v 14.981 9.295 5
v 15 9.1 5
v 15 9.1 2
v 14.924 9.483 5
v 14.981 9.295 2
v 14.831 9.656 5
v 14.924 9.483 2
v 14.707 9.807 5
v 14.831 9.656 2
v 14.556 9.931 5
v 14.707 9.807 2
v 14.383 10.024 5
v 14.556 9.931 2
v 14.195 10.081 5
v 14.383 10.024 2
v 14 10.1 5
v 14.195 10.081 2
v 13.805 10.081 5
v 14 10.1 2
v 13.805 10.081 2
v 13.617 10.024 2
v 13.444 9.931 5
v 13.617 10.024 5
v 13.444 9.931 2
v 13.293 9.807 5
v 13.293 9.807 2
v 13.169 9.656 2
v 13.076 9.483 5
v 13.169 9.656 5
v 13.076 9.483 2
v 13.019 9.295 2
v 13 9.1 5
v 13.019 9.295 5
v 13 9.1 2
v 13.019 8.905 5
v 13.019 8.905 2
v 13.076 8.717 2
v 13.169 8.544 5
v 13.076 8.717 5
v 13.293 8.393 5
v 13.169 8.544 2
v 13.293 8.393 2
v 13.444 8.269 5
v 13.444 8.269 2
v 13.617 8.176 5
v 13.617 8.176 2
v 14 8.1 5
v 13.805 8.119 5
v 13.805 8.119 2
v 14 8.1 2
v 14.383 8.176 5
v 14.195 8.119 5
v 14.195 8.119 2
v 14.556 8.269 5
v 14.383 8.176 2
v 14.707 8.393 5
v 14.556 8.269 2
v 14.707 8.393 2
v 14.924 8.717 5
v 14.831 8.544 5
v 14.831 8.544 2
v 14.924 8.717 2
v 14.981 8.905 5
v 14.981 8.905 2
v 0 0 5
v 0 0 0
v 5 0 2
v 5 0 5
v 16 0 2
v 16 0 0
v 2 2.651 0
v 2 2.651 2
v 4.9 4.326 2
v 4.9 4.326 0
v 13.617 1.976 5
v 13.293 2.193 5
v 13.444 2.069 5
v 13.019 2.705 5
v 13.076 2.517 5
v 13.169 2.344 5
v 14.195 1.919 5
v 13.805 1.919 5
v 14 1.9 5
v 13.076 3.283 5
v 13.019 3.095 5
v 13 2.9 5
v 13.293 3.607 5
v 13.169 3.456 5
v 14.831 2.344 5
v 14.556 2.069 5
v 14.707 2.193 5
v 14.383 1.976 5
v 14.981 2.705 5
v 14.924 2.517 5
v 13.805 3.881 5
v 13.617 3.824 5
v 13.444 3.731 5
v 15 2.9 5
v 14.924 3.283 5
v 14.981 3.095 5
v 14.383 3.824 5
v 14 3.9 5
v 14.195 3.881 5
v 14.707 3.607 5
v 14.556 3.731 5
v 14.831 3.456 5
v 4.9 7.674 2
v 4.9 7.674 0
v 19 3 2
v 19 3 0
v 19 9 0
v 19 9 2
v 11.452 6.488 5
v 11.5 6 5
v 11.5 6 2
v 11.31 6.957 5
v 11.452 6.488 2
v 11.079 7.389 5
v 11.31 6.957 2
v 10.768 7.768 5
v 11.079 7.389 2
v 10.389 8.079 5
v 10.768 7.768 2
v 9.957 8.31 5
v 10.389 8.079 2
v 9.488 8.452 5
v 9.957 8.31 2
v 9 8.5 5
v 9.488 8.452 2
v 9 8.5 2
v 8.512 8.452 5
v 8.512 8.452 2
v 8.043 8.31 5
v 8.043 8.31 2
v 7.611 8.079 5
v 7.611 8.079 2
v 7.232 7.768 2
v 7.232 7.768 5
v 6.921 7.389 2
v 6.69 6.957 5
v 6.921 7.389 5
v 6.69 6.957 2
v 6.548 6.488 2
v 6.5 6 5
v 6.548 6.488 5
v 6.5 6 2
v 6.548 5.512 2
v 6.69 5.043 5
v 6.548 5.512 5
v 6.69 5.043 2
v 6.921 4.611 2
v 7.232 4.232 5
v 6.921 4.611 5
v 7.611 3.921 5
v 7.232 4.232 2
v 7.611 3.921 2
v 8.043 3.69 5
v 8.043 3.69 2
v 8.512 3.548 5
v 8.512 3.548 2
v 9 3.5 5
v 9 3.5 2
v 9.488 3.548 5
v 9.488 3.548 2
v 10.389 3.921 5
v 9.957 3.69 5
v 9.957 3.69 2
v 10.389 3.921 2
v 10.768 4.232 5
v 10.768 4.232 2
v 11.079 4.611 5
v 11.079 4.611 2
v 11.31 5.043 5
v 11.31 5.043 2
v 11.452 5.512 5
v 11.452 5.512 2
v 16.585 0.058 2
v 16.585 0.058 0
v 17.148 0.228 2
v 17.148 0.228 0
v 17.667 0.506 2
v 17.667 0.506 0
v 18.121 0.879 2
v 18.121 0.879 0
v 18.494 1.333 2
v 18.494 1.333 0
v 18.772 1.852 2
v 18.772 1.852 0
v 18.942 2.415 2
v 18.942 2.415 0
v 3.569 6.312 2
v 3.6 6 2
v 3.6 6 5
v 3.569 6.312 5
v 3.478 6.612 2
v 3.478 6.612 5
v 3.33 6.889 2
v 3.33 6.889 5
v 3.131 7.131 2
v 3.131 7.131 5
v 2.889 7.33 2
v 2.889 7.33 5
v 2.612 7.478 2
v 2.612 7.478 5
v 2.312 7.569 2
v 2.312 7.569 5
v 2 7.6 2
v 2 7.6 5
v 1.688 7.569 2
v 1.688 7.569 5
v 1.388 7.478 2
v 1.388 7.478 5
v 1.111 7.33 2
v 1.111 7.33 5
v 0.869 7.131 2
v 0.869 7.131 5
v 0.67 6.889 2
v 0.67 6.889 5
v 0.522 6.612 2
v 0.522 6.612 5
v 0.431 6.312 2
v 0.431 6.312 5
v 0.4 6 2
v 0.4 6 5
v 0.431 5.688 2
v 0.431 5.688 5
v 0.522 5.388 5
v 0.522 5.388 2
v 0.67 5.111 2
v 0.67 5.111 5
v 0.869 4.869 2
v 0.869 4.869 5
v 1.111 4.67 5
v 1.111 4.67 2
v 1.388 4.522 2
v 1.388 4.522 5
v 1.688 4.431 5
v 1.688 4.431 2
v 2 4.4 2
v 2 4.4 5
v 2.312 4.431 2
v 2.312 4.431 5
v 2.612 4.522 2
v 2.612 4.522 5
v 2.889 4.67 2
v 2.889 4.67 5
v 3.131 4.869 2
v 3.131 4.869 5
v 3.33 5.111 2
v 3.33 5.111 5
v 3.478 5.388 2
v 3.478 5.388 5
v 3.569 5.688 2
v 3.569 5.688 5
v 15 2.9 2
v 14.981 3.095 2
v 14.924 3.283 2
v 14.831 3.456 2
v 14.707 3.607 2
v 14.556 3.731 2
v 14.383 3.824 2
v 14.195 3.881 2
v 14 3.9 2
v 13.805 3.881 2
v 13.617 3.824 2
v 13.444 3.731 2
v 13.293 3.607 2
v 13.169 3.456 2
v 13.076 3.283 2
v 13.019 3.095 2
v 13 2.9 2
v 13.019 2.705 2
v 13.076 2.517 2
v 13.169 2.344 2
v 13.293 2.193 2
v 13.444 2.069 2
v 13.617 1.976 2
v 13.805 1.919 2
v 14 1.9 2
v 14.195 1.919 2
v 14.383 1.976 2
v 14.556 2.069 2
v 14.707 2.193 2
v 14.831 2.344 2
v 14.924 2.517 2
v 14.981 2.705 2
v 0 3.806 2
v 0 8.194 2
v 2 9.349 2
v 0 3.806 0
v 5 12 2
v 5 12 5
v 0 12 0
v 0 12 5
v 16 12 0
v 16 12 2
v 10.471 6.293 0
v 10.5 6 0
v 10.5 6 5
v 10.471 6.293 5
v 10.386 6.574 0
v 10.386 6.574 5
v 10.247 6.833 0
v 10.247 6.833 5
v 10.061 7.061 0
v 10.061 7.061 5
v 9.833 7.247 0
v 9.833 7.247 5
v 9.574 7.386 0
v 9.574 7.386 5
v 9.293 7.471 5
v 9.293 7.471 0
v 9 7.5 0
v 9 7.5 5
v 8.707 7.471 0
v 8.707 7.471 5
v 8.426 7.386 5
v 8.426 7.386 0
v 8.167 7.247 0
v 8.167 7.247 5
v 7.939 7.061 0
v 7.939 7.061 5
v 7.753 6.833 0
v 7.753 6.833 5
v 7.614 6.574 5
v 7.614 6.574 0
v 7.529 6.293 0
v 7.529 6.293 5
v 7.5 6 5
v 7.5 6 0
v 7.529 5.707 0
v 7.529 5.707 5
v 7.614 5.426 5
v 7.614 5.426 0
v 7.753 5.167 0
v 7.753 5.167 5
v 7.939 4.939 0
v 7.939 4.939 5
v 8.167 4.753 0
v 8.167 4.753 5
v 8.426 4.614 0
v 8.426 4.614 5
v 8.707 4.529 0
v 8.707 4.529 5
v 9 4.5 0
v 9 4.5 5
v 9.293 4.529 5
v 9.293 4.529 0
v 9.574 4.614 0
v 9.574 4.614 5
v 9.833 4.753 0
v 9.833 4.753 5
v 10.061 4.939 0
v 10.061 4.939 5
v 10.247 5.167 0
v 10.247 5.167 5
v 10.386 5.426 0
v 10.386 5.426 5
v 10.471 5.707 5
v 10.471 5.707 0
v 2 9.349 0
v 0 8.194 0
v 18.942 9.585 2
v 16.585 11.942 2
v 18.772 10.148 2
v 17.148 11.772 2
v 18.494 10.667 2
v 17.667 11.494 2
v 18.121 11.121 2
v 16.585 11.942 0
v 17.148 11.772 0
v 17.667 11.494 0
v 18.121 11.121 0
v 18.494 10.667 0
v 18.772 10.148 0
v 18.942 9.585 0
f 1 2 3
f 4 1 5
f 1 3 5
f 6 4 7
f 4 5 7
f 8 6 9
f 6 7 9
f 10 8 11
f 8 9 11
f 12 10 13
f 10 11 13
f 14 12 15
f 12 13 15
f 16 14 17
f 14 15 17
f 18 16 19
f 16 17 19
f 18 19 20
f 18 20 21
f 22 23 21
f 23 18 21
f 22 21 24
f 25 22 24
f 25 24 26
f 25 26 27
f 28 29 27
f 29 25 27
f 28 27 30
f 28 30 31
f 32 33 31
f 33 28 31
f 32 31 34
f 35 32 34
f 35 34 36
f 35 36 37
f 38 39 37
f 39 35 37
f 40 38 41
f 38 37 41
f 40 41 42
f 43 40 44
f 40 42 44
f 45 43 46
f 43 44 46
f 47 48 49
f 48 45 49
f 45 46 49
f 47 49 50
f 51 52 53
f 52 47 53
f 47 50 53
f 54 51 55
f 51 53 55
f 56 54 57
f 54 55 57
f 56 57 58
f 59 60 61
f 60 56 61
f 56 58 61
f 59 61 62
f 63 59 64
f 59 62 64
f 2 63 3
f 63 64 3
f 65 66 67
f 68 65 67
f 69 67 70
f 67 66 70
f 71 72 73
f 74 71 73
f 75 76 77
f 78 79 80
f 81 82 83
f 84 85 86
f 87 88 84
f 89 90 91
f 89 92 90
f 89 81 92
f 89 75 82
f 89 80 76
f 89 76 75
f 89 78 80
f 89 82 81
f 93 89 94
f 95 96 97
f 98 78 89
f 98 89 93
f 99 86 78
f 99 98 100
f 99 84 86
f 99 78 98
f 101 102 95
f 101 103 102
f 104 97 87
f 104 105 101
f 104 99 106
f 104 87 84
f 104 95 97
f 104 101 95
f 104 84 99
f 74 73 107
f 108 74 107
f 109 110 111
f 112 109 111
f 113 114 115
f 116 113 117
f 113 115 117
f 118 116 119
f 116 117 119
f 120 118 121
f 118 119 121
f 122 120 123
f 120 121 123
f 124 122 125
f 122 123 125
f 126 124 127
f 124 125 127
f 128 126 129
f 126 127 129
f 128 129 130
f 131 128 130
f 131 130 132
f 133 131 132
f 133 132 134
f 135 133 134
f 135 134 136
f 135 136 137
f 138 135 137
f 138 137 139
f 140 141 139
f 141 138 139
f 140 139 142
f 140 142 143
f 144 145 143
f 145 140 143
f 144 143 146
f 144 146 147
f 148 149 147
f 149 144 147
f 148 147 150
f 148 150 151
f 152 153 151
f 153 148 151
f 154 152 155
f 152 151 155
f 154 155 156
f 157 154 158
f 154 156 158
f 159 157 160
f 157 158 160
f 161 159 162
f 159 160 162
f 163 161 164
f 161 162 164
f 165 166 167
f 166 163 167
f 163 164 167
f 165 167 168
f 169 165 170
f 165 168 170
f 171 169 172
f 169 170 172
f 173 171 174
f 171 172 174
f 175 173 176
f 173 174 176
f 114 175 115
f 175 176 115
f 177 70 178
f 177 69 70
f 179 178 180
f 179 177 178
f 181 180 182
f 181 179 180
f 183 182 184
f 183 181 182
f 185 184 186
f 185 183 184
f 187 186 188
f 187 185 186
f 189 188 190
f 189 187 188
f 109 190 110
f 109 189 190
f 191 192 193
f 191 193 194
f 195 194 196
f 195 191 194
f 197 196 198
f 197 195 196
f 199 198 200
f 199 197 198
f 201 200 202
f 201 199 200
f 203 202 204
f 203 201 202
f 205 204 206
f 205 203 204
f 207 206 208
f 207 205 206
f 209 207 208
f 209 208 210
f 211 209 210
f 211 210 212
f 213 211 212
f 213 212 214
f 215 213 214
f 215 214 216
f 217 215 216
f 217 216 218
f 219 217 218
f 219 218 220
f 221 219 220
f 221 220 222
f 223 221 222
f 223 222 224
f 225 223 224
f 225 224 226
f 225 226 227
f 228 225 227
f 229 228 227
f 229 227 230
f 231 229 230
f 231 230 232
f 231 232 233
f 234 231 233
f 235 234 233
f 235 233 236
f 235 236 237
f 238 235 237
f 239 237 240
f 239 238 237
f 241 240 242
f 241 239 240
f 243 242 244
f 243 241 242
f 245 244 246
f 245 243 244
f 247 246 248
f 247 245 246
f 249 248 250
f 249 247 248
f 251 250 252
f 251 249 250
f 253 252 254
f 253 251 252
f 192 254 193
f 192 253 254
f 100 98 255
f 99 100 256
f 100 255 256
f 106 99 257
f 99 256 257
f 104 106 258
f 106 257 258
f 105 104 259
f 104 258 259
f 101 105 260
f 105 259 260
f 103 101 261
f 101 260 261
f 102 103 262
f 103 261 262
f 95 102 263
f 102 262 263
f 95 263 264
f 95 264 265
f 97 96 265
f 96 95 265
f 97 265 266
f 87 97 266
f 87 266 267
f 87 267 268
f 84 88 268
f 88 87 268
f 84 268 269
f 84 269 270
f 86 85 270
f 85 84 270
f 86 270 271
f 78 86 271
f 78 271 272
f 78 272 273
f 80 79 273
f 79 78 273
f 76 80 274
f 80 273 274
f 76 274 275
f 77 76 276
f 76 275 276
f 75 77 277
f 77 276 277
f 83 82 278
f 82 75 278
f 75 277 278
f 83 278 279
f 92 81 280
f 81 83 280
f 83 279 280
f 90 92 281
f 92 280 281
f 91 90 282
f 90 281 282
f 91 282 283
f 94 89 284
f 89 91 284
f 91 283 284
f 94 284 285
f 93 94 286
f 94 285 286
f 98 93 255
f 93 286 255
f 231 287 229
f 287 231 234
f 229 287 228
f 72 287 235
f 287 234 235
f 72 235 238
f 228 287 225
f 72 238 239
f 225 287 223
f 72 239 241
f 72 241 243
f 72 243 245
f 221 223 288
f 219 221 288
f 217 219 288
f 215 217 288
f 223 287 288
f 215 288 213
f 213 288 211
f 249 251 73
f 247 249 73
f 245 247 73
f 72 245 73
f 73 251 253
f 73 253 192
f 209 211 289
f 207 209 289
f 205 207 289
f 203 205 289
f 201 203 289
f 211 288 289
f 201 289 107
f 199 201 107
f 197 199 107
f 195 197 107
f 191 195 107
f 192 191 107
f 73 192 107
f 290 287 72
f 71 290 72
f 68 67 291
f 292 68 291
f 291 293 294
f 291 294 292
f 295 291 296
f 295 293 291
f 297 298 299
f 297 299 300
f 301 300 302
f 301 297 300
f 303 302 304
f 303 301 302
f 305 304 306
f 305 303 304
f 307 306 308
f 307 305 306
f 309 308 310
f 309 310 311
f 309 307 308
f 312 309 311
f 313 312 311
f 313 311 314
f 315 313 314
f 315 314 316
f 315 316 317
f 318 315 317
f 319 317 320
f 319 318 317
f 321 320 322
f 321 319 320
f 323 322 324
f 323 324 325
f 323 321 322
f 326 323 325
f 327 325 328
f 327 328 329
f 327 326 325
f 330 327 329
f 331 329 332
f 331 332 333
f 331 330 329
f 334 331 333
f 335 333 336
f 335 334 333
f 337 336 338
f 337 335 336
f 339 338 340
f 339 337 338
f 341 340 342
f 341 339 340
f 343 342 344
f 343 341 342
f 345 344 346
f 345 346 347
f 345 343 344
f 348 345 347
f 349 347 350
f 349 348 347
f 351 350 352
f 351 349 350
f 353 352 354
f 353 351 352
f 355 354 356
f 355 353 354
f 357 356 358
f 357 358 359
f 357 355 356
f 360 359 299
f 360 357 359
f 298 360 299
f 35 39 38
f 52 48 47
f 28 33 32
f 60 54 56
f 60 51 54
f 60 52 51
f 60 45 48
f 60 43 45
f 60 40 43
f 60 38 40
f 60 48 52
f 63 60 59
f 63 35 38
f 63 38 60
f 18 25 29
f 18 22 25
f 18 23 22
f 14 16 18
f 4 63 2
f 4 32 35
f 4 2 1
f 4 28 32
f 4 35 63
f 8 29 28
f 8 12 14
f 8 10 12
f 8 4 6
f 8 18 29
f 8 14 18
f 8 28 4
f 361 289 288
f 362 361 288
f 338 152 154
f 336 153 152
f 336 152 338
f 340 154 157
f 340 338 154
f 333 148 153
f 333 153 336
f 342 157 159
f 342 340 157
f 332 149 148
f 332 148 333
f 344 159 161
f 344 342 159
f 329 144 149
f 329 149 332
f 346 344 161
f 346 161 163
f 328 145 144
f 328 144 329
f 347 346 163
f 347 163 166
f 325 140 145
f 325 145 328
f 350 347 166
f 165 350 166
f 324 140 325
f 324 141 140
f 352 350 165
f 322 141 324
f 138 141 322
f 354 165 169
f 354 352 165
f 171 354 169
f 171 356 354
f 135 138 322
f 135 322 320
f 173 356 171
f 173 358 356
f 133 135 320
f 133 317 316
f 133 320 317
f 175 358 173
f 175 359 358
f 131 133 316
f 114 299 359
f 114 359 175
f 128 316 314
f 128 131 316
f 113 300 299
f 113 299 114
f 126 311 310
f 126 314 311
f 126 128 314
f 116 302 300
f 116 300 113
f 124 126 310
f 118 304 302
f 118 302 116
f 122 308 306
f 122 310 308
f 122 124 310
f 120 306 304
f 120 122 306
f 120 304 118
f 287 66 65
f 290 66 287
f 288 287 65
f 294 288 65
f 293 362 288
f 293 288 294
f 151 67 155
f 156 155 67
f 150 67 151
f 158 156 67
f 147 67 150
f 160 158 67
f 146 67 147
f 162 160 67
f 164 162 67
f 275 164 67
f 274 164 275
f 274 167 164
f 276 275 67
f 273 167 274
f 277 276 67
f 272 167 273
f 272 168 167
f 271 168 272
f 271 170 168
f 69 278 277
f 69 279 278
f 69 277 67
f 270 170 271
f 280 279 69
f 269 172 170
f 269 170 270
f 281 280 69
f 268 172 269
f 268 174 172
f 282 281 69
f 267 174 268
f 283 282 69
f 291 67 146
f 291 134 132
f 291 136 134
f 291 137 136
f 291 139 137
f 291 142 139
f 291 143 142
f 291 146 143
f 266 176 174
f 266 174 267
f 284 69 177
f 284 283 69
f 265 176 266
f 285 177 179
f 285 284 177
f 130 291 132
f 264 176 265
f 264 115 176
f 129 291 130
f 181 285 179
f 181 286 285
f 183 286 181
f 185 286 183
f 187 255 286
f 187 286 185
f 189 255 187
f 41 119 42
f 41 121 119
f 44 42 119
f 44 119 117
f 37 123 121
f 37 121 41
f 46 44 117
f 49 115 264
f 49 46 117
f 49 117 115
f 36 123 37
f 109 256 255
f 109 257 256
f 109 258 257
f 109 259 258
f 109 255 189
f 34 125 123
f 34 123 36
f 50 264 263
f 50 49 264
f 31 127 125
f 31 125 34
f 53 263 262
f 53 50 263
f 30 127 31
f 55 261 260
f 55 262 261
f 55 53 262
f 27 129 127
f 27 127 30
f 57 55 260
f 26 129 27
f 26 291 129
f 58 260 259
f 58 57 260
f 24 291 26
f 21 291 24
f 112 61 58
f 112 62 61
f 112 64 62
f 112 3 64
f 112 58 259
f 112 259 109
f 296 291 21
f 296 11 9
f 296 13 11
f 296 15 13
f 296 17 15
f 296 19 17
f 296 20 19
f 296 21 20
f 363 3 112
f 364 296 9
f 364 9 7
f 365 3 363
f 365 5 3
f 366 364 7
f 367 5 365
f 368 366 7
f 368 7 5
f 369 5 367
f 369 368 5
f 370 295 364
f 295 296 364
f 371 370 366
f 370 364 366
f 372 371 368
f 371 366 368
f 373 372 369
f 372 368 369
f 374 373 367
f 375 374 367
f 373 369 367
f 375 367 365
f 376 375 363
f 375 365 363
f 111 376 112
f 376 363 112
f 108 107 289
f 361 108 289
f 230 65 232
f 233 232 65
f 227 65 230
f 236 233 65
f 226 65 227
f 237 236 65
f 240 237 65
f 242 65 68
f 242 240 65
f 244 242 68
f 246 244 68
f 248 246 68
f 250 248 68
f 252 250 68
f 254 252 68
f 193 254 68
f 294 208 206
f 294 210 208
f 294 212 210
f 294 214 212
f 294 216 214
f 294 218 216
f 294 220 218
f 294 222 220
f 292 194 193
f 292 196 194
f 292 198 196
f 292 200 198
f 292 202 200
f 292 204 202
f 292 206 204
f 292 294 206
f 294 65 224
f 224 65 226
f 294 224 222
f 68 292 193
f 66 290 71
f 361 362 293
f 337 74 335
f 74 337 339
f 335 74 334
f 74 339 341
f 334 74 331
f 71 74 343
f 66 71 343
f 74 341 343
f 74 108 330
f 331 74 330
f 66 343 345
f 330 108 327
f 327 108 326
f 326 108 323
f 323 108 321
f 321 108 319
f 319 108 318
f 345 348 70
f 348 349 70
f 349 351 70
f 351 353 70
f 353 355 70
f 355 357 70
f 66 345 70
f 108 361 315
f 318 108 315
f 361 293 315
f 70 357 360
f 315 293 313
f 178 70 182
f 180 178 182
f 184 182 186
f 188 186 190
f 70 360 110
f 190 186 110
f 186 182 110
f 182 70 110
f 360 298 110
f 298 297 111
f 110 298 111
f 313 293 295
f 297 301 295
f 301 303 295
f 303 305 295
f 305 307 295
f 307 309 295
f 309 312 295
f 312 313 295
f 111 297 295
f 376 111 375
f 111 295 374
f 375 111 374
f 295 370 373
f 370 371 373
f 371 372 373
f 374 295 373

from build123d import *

# Parameters (mm, degrees)
SKETCH_W        = 19
SKETCH_H        = 12
SKETCH_R        = 1.6
SKETCH_R_2      = 1.5
PAD_DEPTH       = 5
SKETCH001_W     = 14
SKETCH001_H     = 12
SKETCH001_R     = 2.5
SKETCH001_R_2   = 1
POCKET_DEPTH    = 3.001
POCKET001_DEPTH = 2.001
FILLET_R        = 3


with BuildPart() as part:
    # Sketch → Pad (new body)
    with BuildSketch(Plane.XY):
        with Locations((9.5, 6)):
            Rectangle(SKETCH_W, SKETCH_H)
        with Locations((2, 6)):
            Circle(SKETCH_R, mode=Mode.SUBTRACT)
        with Locations((9, 6)):
            Circle(SKETCH_R_2, mode=Mode.SUBTRACT)
    extrude(amount=PAD_DEPTH)

    # Sketch001 (on DatumPlane) → Pocket (cut, through all)
    with BuildSketch(Plane.XY.offset(2)):
        with Locations((12, 6)):
            Rectangle(SKETCH001_W, SKETCH001_H)
        with Locations((9, 6)):
            Circle(SKETCH001_R, mode=Mode.SUBTRACT)
        with Locations((14, 9.1)):
            Circle(SKETCH001_R_2, mode=Mode.SUBTRACT)
        with Locations((14, 2.9)):
            Circle(SKETCH001_R_2, mode=Mode.SUBTRACT)
    extrude(amount=POCKET_DEPTH, mode=Mode.SUBTRACT)

    # Sketch002 (on DatumPlane) → Pocket001 (cut, through all)
    with BuildSketch(Plane.XY.offset(2)):
        Polygon((4.9, 4.325684), (4.9, 7.674316), (2, 9.348632), (-0.9, 7.674316), (-0.9, 4.325684), (2, 2.651368), align=None)
    extrude(amount=-POCKET001_DEPTH, mode=Mode.SUBTRACT)

    # Fillet
    fillet_edges = [part.edges().sort_by_distance(p)[0] for p in [
        (19, 0, 1),
        (19, 12, 1),
    ]]
    fillet(fillet_edges, radius=FILLET_R)


solid = part.part
